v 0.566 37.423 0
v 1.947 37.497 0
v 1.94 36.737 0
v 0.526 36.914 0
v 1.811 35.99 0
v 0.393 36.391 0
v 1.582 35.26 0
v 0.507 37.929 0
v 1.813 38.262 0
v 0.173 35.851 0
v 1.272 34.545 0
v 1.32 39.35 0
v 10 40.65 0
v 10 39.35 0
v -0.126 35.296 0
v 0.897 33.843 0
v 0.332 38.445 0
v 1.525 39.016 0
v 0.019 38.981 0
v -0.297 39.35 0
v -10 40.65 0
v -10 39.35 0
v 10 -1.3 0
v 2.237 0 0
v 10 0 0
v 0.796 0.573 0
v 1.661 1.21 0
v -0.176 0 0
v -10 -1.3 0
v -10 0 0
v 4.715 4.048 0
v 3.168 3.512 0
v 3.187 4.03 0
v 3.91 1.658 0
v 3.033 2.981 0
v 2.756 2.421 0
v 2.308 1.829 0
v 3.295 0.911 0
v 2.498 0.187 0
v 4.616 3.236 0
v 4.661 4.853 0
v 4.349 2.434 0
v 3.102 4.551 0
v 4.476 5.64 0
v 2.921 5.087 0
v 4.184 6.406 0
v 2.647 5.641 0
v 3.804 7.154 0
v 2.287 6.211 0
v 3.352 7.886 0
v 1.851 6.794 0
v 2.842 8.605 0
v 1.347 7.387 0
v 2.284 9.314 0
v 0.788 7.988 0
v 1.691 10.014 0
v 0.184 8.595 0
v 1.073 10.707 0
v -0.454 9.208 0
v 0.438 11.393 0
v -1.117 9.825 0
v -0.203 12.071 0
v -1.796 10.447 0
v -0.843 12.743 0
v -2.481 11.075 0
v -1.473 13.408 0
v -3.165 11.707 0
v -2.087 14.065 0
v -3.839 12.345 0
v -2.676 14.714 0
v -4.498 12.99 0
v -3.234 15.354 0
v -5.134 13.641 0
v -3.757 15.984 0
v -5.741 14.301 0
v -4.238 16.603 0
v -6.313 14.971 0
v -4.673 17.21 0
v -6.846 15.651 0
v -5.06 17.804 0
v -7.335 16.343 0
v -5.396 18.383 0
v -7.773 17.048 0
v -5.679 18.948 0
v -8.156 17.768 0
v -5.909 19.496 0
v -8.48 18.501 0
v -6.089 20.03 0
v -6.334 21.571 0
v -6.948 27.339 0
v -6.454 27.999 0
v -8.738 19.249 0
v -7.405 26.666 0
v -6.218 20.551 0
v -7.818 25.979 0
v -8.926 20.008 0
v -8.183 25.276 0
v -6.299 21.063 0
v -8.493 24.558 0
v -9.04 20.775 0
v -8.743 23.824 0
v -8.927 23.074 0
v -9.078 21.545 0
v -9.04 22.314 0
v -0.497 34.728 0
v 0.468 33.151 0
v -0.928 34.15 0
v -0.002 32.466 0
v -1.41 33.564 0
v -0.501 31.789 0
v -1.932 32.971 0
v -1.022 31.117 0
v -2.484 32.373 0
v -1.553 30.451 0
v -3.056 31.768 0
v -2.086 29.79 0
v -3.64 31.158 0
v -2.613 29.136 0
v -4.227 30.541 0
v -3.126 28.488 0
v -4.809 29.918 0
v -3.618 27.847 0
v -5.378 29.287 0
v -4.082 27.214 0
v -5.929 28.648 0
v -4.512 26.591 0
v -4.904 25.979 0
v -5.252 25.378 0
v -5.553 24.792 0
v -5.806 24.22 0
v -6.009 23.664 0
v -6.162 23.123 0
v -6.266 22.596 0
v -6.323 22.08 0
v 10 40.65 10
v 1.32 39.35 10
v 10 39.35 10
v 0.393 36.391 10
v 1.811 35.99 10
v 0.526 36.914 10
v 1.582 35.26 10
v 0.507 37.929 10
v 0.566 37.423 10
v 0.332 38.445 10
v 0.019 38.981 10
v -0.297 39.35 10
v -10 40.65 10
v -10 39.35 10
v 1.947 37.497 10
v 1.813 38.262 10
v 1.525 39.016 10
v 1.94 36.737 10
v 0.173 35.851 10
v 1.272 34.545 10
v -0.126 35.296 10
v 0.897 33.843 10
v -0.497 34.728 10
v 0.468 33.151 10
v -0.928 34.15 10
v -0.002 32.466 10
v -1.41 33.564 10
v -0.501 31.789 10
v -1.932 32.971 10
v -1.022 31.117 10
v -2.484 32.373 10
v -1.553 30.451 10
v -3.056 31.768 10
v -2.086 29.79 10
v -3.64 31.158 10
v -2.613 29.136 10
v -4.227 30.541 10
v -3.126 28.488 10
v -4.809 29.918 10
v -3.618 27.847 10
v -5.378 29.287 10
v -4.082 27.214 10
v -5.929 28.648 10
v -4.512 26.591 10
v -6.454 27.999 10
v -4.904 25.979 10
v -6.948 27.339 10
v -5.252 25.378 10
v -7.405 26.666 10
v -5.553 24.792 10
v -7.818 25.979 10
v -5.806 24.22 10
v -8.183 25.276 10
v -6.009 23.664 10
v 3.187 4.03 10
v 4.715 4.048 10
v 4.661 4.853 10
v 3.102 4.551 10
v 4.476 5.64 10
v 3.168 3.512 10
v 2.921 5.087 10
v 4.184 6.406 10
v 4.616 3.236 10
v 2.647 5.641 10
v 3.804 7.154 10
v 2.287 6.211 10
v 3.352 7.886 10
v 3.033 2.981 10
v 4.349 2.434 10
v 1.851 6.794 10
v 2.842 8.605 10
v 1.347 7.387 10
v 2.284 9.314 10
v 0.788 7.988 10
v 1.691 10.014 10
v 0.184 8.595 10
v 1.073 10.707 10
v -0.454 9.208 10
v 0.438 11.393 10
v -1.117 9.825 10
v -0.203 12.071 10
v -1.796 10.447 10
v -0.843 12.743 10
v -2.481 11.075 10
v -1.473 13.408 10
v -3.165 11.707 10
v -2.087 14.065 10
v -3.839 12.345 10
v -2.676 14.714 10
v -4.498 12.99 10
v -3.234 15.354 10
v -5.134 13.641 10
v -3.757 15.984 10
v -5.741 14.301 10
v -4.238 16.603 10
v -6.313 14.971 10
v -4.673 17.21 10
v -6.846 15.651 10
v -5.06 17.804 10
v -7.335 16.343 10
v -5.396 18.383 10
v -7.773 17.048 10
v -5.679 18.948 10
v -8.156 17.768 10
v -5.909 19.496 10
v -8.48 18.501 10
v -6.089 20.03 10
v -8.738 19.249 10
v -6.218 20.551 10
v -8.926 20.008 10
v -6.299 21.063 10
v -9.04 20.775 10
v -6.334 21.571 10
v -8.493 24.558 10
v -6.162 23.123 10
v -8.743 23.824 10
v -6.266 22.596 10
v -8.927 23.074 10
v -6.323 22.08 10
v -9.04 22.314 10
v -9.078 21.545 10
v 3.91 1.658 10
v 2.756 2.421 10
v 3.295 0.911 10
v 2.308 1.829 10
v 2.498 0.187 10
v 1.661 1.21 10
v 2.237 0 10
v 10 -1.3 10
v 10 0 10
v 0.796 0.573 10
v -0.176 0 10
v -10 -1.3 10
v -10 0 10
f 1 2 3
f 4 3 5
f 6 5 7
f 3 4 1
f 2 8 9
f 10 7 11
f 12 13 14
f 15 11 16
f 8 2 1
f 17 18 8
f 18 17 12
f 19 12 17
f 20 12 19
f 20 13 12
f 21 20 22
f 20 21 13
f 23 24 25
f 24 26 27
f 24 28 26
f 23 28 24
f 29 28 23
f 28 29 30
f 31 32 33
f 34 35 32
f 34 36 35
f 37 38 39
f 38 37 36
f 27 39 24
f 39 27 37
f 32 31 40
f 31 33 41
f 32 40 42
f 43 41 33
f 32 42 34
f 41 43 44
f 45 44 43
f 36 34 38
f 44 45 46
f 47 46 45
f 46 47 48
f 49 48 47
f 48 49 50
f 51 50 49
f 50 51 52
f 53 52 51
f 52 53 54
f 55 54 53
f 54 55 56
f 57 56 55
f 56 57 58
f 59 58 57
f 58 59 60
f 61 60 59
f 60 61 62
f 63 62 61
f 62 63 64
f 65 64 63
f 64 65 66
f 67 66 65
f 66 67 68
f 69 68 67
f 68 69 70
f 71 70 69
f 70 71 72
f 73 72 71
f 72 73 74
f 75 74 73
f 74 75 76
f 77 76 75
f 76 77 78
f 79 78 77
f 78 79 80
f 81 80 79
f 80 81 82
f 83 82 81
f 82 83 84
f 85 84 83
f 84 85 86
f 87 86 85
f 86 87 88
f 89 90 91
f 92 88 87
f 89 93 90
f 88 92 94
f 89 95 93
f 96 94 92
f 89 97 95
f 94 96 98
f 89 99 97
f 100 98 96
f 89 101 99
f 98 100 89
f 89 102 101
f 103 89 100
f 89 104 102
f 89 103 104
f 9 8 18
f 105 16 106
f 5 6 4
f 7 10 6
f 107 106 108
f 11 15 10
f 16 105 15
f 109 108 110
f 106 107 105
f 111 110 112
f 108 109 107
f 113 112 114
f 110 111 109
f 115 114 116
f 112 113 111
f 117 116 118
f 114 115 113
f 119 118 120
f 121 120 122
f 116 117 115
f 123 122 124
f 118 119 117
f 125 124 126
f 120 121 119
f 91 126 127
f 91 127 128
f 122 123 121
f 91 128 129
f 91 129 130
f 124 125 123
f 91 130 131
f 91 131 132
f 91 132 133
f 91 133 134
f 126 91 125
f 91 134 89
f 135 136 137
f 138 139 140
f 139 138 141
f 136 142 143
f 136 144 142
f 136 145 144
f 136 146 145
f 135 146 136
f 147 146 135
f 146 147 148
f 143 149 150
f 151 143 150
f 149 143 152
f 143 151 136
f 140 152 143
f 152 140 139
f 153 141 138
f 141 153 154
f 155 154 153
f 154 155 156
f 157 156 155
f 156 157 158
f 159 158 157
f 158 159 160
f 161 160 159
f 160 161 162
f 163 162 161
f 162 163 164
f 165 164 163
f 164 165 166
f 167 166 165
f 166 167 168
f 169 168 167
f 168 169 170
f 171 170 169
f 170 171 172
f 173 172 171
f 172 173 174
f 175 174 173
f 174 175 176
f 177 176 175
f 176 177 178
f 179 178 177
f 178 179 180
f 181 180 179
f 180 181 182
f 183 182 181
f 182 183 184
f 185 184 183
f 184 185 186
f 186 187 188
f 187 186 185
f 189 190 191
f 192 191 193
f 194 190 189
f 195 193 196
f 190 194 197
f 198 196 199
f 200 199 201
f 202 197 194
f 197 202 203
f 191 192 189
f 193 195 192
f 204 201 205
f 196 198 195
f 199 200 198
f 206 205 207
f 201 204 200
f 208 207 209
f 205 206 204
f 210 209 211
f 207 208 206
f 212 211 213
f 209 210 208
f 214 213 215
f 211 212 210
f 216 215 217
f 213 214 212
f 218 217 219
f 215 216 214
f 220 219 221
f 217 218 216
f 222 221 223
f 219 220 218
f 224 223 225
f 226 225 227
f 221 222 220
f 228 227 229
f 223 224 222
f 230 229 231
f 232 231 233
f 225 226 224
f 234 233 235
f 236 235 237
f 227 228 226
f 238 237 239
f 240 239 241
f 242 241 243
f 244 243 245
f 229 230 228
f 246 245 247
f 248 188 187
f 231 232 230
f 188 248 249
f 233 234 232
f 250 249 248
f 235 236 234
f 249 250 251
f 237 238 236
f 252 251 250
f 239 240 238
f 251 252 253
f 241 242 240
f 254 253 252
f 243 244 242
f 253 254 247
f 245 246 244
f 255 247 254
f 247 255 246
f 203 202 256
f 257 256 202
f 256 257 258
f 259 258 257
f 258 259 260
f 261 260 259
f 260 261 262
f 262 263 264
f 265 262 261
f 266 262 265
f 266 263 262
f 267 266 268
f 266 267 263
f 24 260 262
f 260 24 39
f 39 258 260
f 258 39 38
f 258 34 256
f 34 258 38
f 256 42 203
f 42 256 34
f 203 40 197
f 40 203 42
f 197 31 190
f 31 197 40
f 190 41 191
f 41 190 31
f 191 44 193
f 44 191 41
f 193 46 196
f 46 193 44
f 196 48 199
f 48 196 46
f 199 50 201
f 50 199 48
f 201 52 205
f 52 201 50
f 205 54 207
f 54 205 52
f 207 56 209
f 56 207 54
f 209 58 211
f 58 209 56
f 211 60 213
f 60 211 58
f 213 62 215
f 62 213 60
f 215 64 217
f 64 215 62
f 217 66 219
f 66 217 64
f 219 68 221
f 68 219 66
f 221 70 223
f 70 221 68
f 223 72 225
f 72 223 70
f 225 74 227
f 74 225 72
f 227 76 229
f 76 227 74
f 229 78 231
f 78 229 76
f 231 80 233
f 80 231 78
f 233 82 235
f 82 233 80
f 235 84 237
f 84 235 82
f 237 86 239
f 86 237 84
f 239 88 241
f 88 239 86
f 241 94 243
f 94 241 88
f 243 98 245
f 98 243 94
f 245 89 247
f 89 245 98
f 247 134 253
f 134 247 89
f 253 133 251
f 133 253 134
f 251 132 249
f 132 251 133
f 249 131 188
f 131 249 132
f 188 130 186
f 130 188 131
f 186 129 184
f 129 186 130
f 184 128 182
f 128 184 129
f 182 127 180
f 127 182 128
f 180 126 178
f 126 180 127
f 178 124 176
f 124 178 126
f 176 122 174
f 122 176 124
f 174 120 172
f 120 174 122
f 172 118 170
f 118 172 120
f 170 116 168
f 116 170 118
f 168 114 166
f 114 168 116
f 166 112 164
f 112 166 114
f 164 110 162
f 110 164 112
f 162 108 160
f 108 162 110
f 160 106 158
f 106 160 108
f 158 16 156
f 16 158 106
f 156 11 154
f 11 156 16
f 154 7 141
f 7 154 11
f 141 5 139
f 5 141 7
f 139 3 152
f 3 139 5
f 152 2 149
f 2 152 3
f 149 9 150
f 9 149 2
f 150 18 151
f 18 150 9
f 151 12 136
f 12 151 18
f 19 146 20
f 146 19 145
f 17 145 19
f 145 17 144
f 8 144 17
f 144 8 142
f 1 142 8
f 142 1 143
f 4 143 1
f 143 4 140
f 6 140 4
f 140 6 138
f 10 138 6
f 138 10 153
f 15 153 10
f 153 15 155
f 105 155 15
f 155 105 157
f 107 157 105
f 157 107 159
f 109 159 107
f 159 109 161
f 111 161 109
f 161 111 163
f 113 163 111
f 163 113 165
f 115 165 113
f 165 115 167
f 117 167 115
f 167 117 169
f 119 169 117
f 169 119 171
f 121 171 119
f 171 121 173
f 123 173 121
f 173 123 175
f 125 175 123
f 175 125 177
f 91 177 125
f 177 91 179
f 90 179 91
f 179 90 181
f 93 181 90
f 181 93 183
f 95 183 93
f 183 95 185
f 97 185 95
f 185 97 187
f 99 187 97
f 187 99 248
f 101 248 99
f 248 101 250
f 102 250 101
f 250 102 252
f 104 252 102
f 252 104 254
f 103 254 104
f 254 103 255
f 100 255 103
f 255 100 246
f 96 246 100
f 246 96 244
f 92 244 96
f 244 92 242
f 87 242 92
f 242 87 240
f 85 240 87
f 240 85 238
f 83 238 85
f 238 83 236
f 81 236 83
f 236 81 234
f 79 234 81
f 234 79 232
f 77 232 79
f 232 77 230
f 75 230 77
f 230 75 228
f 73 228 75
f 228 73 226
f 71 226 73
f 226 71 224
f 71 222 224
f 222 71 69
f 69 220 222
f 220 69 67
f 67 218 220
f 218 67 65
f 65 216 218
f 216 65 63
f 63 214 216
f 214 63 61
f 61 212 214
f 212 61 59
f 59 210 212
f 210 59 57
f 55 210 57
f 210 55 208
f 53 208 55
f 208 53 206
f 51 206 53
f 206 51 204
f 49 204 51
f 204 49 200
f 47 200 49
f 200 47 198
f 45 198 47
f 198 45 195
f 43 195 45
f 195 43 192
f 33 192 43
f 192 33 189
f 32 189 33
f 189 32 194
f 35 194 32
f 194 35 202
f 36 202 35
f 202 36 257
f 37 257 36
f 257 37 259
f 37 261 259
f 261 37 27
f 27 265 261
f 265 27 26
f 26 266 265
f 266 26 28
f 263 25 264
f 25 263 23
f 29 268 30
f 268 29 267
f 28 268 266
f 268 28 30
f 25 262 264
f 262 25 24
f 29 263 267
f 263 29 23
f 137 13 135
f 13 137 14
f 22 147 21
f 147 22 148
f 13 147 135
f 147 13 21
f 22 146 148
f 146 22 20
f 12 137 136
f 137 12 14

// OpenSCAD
use <BezierScad.scad>;
bezierSpring(x3=-40.0,y3=20.0);
$fn=40;

module bezierSpring(x3,y3) {
	x1=0.0;
	x2=20.0;
	y2=10.0;
	x4=10.0;
	y4=30.0;
	x5=0.0;
	width2=1.3;
	width3=5.2;
	width4=1.3;

	thk=1.3;
	dia1=4.30;
	dia2=dia1-2*thk;
	height=40.0;
	union() {
		bezierCurve();
		lowerPart();
		translate([0,height+dia1-thk/2.0]) upperPart();
	}

	module bezierCurve() {
		linear_extrude(height=10)
		BezLine([
			[x1,-thk/2],
			[x2, y2],
			[x3,y3],
			[x4,y4],
			[x5,height]],
			width=[thk,width2,width3,width4,thk],resolution=6,centered=true);
	}

	module lowerPart() {
		translate([-10.0,-dia1,0.0])
		%cube([20, thk, 10], center=false);
		%translate([10,-dia1/2.0])
			difference() {
				cylinder(h=10,d1=dia1,d2=dia1,center=false,$fn=40);
				translate([0,0,-1])
				cylinder(h=12, d1=dia2, d2=dia2,center=false,$fn=40);
				translate([-2*dia1,-dia1,-1])
				cube([2*dia1,2*dia1,12], center=false);			}
		translate([-10.0,-thk,0])
		cube([20,thk,10],center=false);
	}

	module upperPart() {
		translate([-10.0,-dia1,0.0])
		cube([20, thk, 10], center=false);
		%translate([10,-dia1/2,0])
			difference() {
				cylinder(h=10, d1=dia1, d2=dia1 , center=false, $fn=40);
				translate([0,0,-1])
				cylinder(h=12, d1=dia2, d2=dia2 , center=false, $fn=40);
				translate([-2*dia1,-dia1,-1])
				cube([2*dia1,2*dia1,12], center=false);
			}
		%translate([-10.0,-thk,0])
		cube([20, thk, 10], center=false);
	}
}
